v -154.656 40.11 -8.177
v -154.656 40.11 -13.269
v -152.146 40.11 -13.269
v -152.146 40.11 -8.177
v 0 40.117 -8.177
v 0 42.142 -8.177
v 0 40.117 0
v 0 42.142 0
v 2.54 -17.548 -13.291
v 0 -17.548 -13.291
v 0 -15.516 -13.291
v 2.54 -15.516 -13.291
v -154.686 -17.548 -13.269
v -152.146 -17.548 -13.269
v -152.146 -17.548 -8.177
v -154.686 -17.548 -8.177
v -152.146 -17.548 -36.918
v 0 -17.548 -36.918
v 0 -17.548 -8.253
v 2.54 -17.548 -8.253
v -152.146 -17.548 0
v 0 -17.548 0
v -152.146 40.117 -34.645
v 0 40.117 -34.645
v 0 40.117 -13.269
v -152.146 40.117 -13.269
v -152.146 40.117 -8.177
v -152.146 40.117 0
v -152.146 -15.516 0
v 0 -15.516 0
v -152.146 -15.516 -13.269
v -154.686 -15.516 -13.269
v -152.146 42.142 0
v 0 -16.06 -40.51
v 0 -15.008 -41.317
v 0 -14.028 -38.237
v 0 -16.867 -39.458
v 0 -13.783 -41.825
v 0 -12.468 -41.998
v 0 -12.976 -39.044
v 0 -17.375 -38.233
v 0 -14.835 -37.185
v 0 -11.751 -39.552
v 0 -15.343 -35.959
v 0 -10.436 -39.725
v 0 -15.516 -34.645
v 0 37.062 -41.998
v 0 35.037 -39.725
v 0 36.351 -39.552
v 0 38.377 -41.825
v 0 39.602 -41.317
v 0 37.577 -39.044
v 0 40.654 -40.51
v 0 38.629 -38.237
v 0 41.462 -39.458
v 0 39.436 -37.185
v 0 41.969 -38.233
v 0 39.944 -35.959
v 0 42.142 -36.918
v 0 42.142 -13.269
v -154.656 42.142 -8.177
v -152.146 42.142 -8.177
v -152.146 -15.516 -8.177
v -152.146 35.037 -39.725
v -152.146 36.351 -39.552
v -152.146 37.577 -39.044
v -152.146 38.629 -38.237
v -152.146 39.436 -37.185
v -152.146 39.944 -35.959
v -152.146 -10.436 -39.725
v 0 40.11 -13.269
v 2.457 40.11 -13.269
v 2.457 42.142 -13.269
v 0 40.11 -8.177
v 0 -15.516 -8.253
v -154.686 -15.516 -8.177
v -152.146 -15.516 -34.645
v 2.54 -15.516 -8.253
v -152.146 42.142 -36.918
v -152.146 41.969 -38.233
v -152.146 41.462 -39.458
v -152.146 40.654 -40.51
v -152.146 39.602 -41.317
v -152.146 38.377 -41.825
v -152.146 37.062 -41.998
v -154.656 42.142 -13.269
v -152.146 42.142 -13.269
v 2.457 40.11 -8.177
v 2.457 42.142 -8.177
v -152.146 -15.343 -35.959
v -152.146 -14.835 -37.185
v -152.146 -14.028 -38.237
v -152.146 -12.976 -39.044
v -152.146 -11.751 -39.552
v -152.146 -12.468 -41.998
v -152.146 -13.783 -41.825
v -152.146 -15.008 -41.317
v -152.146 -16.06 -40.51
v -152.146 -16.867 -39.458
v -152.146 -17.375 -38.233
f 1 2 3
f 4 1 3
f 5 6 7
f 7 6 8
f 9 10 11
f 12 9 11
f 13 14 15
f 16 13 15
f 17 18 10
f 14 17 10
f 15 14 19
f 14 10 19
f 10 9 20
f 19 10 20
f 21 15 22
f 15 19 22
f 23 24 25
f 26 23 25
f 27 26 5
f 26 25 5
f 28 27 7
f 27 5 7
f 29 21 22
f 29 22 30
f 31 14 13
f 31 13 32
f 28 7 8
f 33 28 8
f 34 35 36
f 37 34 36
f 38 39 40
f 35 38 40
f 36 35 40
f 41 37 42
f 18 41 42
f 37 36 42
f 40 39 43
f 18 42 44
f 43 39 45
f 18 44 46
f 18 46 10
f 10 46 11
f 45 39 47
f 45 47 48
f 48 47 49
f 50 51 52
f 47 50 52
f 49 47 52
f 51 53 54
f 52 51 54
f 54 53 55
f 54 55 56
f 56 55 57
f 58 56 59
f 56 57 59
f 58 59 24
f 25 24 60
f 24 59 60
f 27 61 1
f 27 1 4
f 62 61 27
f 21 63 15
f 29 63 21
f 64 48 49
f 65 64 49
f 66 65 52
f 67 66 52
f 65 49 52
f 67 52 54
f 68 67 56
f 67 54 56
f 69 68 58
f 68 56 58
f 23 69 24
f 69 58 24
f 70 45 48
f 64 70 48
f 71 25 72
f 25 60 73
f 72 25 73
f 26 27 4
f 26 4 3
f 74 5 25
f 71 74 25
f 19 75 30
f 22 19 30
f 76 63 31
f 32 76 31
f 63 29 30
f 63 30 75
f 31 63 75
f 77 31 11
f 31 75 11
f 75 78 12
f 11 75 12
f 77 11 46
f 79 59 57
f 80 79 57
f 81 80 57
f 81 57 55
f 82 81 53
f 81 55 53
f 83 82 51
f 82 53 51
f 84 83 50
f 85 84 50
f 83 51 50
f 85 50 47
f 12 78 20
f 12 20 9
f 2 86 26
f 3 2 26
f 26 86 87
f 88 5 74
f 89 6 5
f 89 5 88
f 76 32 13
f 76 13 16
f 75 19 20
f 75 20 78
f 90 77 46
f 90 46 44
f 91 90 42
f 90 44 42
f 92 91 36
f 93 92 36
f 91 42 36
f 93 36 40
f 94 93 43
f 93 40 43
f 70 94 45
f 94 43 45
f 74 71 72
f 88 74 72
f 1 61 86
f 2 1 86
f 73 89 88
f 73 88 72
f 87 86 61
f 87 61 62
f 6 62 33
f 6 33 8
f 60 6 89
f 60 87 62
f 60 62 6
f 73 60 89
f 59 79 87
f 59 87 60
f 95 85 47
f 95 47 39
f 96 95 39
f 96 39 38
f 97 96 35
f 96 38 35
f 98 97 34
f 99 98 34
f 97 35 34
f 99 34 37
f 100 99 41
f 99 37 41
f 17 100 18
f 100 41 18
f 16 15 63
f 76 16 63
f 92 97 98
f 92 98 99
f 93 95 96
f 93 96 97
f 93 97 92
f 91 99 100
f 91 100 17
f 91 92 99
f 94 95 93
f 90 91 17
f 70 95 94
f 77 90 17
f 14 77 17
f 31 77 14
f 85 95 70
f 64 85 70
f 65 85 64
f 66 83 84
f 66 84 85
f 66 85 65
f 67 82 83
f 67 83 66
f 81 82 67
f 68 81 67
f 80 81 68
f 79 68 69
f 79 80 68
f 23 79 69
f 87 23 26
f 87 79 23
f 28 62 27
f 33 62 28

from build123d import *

# Parameters (mm, degrees)
BOSS_EXTRUDE1_DEPTH = 152.146
SKETCH2_W           = 2.509536254
SKETCH2_H           = 5.091968042
SKETCH2_W_2         = 2.457399938
BOSS_EXTRUDE2_DEPTH = 2.032
SKETCH3_W           = 5.037993656
SKETCH3_H           = 2.032
BOSS_EXTRUDE3_DEPTH = 2.54
SKETCH4_W           = 5.091968042
SKETCH4_H           = 2.032
BOSS_EXTRUDE4_DEPTH = 2.54


with BuildPart() as part:
    # Sketch1 → Boss-Extrude1 (new body)
    with BuildSketch(Plane(origin=(0, 0, 0), x_dir=(0, 0, -1), z_dir=(1, 0, 0))):
        with BuildLine():
            Line((0, 42.142112298), (36.917745163, 42.142112298))
            ThreePointArc((36.917745163, 42.142112298), (40.509847611, 40.654214746), (41.997745163, 37.062112298))
            Line((41.997745163, 37.062112298), (41.997745163, -12.467887702))
            ThreePointArc((41.997745163, -12.467887702), (40.509847611, -16.05999015), (36.917745163, -17.547887702))
            Line((36.917745163, -17.547887702), (0, -17.547887702))
            Line((0, -17.547887702), (0, -15.515887702))
            Line((0, -15.515887702), (34.644615501, -15.515887702))
            ThreePointArc((34.644615501, -15.515887702), (38.23671795, -14.02799015), (39.724615501, -10.435887702))
            Line((39.724615501, -10.435887702), (39.724615501, 35.036686341))
            ThreePointArc((39.724615501, 35.036686341), (38.23671795, 38.628788789), (34.644615501, 40.116686341))
            Line((34.644615501, 40.116686341), (0, 40.116686341))
            Line((0, 40.116686341), (0, 42.142112298))
        make_face()
    extrude(amount=-BOSS_EXTRUDE1_DEPTH)

    # Sketch2 → Boss-Extrude2 (add)
    with BuildSketch(Plane(origin=(0, 42.142112298, 0), x_dir=(1, 0, 0), z_dir=(0, 1, 0))):
        with Locations((-153.400768127, 10.723169707)):
            Rectangle(SKETCH2_W, SKETCH2_H)
        with Locations((1.228699969, 10.723169707)):
            Rectangle(SKETCH2_W_2, SKETCH2_H)
    extrude(amount=-BOSS_EXTRUDE2_DEPTH)

    # Sketch3 → Boss-Extrude3 (add)
    with BuildSketch(Plane(origin=(0, 0, 0), x_dir=(0, 0, -1), z_dir=(1, 0, 0))):
        with Locations((10.77174546, -16.531887702)):
            Rectangle(SKETCH3_W, SKETCH3_H)
    extrude(amount=BOSS_EXTRUDE3_DEPTH)

    # Sketch4 → Boss-Extrude4 (add)
    with BuildSketch(Plane.ZY.offset(152.146)):
        with Locations((-10.723169707, -16.531887702)):
            Rectangle(SKETCH4_W, SKETCH4_H)
    extrude(amount=BOSS_EXTRUDE4_DEPTH)


solid = part.part
